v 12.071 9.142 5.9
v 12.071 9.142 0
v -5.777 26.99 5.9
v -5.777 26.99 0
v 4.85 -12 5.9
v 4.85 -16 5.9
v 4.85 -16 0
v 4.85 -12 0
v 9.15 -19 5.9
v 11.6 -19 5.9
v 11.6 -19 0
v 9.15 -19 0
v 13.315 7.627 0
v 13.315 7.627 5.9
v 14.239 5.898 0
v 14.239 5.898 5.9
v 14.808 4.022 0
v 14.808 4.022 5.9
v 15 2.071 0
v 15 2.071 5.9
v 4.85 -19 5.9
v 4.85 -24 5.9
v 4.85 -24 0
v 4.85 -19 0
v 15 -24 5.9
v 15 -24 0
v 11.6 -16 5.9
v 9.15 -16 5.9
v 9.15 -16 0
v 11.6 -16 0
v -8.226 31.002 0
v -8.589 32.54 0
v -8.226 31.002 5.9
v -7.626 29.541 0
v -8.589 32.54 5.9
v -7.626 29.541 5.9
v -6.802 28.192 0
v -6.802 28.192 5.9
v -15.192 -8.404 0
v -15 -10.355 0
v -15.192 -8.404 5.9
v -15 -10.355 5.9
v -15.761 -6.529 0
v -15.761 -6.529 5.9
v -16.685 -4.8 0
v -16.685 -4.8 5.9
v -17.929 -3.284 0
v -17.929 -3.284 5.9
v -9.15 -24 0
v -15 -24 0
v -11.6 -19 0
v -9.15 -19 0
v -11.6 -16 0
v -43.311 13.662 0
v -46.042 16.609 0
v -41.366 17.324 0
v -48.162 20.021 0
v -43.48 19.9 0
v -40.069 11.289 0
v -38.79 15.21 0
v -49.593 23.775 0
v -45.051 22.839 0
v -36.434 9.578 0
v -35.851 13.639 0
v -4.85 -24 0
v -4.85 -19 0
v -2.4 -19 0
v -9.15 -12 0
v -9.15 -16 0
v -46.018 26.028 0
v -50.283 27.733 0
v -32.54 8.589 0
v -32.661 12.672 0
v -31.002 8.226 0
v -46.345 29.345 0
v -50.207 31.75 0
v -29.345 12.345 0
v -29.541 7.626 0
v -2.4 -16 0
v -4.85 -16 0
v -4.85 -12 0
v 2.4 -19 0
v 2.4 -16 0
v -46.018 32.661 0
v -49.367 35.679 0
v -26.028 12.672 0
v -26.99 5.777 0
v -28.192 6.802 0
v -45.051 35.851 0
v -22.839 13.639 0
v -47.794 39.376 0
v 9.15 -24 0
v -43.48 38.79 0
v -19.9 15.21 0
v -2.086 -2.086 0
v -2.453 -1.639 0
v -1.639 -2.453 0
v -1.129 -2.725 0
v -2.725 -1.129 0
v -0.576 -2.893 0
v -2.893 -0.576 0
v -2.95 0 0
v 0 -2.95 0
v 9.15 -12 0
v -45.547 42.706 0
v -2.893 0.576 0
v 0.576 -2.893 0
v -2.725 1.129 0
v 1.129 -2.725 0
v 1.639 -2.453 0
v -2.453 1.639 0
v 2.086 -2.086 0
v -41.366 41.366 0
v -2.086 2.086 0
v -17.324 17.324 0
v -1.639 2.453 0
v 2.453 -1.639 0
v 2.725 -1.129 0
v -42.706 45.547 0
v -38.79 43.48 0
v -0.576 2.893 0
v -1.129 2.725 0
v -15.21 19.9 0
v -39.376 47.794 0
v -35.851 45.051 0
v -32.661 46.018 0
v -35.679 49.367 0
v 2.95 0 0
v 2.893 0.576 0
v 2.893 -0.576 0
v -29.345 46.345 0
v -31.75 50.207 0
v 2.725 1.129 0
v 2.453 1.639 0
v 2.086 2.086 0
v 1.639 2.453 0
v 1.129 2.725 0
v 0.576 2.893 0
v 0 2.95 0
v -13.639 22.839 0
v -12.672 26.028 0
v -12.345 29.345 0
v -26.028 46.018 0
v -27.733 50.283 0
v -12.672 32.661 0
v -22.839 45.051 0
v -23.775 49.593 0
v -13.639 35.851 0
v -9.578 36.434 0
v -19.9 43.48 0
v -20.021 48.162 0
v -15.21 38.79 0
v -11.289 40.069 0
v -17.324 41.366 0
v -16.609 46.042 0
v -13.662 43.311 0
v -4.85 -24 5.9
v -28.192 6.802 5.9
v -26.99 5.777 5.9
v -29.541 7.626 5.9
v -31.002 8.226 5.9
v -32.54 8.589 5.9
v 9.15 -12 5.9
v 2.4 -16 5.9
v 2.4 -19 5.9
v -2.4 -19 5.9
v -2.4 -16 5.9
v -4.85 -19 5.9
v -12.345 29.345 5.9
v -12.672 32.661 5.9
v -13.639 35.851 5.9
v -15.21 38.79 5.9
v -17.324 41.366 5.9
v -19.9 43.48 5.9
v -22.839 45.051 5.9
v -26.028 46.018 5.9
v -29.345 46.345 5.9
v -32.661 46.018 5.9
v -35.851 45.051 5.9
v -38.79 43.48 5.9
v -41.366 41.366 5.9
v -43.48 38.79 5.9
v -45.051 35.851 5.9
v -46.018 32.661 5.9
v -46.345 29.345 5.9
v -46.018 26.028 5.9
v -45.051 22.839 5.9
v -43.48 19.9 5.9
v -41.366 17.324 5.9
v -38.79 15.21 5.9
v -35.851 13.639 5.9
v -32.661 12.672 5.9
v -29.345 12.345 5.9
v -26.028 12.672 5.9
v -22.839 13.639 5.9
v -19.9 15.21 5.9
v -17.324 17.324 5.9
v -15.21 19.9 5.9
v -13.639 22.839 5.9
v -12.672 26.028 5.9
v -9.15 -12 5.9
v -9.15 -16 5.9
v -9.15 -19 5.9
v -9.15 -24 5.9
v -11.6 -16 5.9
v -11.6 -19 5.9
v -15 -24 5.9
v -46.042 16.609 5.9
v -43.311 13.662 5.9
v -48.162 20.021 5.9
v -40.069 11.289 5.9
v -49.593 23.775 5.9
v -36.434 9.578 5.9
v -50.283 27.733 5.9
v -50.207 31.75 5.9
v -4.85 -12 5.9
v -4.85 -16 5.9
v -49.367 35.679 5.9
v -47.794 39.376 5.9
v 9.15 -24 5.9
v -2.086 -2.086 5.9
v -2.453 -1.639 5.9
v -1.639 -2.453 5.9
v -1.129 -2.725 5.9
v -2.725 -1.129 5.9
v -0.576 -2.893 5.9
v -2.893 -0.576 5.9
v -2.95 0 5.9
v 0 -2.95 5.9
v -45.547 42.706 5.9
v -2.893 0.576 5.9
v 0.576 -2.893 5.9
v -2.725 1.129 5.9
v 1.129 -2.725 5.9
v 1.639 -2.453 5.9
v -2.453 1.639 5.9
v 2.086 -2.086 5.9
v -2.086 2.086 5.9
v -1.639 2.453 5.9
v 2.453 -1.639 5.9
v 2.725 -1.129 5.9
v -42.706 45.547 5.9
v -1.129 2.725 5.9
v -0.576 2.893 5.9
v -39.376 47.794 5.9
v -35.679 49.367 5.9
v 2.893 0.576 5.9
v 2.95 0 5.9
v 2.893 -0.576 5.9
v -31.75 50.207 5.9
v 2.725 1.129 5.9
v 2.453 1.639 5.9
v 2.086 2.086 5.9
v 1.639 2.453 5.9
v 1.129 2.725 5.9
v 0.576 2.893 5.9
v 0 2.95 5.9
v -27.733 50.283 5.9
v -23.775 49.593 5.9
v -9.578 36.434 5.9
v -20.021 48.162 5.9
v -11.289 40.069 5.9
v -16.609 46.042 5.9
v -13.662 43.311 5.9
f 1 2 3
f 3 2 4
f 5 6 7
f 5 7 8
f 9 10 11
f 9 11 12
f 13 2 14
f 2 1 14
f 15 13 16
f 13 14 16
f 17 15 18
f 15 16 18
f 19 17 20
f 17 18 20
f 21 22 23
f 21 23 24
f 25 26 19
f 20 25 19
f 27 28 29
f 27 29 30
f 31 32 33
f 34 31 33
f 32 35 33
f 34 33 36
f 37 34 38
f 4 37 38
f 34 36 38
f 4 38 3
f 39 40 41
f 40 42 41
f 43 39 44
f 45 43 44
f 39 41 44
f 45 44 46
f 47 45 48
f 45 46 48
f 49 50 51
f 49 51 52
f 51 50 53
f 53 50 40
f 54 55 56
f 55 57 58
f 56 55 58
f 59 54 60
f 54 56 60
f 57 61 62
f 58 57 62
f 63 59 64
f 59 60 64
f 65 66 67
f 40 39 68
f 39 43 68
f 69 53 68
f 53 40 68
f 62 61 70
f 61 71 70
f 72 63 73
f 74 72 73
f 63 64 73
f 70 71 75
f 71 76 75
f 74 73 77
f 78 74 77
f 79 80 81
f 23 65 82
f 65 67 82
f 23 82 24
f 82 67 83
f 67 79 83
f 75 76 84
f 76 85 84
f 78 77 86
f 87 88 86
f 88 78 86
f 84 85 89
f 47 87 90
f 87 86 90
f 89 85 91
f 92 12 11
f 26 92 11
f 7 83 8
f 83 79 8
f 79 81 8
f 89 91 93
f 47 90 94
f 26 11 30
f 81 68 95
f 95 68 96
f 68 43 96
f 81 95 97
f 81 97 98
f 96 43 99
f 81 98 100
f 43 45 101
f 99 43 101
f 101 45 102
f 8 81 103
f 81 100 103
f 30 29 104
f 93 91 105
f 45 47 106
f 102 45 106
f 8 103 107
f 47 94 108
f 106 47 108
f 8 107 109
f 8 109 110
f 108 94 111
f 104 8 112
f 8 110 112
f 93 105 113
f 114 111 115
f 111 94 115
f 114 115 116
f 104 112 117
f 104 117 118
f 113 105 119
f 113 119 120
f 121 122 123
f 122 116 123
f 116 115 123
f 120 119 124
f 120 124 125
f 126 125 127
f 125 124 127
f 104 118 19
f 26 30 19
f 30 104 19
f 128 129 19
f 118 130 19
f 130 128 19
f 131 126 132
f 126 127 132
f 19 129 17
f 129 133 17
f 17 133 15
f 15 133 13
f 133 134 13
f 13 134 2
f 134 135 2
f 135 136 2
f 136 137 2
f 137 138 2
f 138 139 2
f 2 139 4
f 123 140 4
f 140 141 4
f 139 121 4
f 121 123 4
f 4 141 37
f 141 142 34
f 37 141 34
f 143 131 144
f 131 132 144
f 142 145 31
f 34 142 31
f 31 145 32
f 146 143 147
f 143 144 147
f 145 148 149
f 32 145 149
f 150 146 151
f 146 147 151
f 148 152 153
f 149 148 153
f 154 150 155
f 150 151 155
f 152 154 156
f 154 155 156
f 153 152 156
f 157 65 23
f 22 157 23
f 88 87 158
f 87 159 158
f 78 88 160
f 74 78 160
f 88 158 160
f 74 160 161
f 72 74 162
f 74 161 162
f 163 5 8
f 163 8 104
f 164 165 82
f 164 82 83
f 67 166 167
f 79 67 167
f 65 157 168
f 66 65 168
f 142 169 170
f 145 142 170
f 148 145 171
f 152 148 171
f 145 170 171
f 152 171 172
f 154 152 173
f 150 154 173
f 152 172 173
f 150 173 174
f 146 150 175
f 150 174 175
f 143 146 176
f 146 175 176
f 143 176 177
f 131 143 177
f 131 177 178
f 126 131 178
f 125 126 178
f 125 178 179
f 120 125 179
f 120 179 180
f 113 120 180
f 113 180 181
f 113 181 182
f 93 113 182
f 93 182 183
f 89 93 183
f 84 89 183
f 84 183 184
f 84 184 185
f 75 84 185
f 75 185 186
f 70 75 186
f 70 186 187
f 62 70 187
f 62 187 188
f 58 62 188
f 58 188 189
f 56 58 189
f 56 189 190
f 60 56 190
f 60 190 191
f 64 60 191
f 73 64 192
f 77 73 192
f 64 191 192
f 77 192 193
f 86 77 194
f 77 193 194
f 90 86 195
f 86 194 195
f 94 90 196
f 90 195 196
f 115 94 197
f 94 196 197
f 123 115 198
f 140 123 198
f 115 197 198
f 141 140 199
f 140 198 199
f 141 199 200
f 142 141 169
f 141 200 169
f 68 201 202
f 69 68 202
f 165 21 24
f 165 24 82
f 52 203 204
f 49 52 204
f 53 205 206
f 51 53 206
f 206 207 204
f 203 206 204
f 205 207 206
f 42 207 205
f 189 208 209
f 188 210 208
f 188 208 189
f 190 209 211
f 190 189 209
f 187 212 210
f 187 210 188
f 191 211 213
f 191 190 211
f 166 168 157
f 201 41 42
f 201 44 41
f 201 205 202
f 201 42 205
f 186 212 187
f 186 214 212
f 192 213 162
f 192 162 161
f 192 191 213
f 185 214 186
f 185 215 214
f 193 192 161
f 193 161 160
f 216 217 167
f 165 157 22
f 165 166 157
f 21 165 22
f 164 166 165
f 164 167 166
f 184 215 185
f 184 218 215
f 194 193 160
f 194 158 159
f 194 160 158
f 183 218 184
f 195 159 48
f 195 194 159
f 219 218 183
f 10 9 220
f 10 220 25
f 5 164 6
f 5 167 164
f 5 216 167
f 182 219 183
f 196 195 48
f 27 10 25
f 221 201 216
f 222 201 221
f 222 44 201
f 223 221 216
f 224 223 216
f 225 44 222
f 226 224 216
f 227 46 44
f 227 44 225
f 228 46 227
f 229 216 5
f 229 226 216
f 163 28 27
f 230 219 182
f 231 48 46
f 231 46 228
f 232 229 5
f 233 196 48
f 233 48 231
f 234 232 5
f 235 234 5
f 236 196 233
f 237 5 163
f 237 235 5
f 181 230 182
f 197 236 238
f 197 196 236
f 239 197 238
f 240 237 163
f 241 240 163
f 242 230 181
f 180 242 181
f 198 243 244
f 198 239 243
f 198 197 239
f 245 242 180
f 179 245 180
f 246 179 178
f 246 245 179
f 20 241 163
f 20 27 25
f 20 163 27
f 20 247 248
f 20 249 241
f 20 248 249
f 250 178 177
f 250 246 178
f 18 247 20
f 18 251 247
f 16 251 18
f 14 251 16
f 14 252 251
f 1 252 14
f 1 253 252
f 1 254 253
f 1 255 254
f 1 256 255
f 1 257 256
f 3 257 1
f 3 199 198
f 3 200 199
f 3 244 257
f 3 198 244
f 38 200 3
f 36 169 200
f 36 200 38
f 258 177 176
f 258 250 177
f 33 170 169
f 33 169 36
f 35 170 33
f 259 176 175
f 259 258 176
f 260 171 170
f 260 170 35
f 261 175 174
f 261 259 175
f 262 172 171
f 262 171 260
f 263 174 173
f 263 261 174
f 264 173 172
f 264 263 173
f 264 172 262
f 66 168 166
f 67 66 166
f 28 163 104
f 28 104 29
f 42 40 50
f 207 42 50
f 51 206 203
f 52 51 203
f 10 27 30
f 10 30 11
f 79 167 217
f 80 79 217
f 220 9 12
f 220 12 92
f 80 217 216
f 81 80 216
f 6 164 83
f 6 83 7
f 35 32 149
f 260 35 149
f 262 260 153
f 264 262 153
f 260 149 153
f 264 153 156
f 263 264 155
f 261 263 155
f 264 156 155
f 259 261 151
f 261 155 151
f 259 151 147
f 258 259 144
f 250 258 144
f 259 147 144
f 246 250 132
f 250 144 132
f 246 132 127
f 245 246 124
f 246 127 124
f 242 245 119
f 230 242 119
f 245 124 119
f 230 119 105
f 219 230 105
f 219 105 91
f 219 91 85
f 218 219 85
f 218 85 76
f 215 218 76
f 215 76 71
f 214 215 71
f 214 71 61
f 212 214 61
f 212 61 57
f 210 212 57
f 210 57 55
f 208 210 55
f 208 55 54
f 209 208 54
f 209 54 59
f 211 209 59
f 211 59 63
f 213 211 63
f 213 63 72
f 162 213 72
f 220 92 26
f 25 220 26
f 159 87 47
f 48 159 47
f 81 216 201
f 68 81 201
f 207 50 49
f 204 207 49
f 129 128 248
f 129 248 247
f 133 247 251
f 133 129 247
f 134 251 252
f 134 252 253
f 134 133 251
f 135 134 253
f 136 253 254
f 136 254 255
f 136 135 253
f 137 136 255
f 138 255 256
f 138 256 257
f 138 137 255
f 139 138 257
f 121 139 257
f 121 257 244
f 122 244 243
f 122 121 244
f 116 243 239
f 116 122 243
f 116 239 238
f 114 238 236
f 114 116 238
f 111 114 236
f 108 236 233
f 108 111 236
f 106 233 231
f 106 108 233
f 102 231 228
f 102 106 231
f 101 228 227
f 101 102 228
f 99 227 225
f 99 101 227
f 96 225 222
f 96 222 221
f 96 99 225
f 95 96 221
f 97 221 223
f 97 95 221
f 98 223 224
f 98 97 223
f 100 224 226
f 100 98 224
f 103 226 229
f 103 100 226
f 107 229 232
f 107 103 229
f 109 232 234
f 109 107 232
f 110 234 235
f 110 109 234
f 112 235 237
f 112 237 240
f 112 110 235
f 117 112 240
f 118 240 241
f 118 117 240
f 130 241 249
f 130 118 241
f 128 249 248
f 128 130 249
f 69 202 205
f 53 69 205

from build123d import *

# Parameters (mm, degrees)
SKETCH1_R           = 2.95
BOSS_EXTRUDE1_DEPTH = 5.9
SKETCH2_R           = 17
CUT_EXTRUDE1_DEPTH  = 72.442524026
CUT_EXTRUDE2_DEPTH  = 72.442524026
FILLET1_R           = 10


with BuildPart() as part:
    # Sketch1 → Boss-Extrude1 (new body)
    with BuildSketch(Plane.XY):
        with BuildLine():
            Line((-15, -6.213203436), (-15, -24))
            Line((-15, -24), (15, -24))
            Line((15, -24), (15, 6.213203436))
            Line((15, 6.213203436), (-8.346024856, 29.559228292))
            ThreePointArc((-8.346024856, 29.559228292), (-44.194173824, 44.194173824), (-29.559228292, 8.346024856))
            Line((-29.559228292, 8.346024856), (-15, -6.213203436))
        make_face()
        Circle(SKETCH1_R, mode=Mode.SUBTRACT)
    extrude(amount=BOSS_EXTRUDE1_DEPTH)

    # Sketch2 → Cut-Extrude1 (cut, through all)
    with BuildSketch(Plane.XY.offset(5.9)):
        with Locations((-29.344931419, 29.344931419)):
            Circle(SKETCH2_R)
    extrude(amount=-CUT_EXTRUDE1_DEPTH, mode=Mode.SUBTRACT)

    # Sketch3 → Cut-Extrude2 (cut, through all)
    with BuildSketch(Plane.XY.offset(5.9)):
        Polygon((-9.15, -24), (-4.85, -24), (-4.85, -19), (-2.4, -19), (-2.4, -16), (-4.85, -16), (-4.85, -12), (-9.15, -12), (-9.15, -16), (-11.6, -16), (-11.6, -19), (-9.15, -19), align=None)
        Polygon((4.85, -16), (4.85, -12), (9.15, -12), (9.15, -16), (11.6, -16), (11.6, -19), (9.15, -19), (9.15, -24), (4.85, -24), (4.85, -19), (2.4, -19), (2.4, -16), align=None)
    extrude(amount=-CUT_EXTRUDE2_DEPTH, mode=Mode.SUBTRACT)

    # Fillet1
    fillet1_edges = [part.edges().sort_by_distance(p)[0] for p in [
        (-8.346024856, 29.559228292, 2.95),
        (15, 6.213203436, 2.95),
        (-15, -6.213203436, 2.95),
        (-29.559228292, 8.346024856, 2.95),
    ]]
    fillet(fillet1_edges, radius=FILLET1_R)


solid = part.part
